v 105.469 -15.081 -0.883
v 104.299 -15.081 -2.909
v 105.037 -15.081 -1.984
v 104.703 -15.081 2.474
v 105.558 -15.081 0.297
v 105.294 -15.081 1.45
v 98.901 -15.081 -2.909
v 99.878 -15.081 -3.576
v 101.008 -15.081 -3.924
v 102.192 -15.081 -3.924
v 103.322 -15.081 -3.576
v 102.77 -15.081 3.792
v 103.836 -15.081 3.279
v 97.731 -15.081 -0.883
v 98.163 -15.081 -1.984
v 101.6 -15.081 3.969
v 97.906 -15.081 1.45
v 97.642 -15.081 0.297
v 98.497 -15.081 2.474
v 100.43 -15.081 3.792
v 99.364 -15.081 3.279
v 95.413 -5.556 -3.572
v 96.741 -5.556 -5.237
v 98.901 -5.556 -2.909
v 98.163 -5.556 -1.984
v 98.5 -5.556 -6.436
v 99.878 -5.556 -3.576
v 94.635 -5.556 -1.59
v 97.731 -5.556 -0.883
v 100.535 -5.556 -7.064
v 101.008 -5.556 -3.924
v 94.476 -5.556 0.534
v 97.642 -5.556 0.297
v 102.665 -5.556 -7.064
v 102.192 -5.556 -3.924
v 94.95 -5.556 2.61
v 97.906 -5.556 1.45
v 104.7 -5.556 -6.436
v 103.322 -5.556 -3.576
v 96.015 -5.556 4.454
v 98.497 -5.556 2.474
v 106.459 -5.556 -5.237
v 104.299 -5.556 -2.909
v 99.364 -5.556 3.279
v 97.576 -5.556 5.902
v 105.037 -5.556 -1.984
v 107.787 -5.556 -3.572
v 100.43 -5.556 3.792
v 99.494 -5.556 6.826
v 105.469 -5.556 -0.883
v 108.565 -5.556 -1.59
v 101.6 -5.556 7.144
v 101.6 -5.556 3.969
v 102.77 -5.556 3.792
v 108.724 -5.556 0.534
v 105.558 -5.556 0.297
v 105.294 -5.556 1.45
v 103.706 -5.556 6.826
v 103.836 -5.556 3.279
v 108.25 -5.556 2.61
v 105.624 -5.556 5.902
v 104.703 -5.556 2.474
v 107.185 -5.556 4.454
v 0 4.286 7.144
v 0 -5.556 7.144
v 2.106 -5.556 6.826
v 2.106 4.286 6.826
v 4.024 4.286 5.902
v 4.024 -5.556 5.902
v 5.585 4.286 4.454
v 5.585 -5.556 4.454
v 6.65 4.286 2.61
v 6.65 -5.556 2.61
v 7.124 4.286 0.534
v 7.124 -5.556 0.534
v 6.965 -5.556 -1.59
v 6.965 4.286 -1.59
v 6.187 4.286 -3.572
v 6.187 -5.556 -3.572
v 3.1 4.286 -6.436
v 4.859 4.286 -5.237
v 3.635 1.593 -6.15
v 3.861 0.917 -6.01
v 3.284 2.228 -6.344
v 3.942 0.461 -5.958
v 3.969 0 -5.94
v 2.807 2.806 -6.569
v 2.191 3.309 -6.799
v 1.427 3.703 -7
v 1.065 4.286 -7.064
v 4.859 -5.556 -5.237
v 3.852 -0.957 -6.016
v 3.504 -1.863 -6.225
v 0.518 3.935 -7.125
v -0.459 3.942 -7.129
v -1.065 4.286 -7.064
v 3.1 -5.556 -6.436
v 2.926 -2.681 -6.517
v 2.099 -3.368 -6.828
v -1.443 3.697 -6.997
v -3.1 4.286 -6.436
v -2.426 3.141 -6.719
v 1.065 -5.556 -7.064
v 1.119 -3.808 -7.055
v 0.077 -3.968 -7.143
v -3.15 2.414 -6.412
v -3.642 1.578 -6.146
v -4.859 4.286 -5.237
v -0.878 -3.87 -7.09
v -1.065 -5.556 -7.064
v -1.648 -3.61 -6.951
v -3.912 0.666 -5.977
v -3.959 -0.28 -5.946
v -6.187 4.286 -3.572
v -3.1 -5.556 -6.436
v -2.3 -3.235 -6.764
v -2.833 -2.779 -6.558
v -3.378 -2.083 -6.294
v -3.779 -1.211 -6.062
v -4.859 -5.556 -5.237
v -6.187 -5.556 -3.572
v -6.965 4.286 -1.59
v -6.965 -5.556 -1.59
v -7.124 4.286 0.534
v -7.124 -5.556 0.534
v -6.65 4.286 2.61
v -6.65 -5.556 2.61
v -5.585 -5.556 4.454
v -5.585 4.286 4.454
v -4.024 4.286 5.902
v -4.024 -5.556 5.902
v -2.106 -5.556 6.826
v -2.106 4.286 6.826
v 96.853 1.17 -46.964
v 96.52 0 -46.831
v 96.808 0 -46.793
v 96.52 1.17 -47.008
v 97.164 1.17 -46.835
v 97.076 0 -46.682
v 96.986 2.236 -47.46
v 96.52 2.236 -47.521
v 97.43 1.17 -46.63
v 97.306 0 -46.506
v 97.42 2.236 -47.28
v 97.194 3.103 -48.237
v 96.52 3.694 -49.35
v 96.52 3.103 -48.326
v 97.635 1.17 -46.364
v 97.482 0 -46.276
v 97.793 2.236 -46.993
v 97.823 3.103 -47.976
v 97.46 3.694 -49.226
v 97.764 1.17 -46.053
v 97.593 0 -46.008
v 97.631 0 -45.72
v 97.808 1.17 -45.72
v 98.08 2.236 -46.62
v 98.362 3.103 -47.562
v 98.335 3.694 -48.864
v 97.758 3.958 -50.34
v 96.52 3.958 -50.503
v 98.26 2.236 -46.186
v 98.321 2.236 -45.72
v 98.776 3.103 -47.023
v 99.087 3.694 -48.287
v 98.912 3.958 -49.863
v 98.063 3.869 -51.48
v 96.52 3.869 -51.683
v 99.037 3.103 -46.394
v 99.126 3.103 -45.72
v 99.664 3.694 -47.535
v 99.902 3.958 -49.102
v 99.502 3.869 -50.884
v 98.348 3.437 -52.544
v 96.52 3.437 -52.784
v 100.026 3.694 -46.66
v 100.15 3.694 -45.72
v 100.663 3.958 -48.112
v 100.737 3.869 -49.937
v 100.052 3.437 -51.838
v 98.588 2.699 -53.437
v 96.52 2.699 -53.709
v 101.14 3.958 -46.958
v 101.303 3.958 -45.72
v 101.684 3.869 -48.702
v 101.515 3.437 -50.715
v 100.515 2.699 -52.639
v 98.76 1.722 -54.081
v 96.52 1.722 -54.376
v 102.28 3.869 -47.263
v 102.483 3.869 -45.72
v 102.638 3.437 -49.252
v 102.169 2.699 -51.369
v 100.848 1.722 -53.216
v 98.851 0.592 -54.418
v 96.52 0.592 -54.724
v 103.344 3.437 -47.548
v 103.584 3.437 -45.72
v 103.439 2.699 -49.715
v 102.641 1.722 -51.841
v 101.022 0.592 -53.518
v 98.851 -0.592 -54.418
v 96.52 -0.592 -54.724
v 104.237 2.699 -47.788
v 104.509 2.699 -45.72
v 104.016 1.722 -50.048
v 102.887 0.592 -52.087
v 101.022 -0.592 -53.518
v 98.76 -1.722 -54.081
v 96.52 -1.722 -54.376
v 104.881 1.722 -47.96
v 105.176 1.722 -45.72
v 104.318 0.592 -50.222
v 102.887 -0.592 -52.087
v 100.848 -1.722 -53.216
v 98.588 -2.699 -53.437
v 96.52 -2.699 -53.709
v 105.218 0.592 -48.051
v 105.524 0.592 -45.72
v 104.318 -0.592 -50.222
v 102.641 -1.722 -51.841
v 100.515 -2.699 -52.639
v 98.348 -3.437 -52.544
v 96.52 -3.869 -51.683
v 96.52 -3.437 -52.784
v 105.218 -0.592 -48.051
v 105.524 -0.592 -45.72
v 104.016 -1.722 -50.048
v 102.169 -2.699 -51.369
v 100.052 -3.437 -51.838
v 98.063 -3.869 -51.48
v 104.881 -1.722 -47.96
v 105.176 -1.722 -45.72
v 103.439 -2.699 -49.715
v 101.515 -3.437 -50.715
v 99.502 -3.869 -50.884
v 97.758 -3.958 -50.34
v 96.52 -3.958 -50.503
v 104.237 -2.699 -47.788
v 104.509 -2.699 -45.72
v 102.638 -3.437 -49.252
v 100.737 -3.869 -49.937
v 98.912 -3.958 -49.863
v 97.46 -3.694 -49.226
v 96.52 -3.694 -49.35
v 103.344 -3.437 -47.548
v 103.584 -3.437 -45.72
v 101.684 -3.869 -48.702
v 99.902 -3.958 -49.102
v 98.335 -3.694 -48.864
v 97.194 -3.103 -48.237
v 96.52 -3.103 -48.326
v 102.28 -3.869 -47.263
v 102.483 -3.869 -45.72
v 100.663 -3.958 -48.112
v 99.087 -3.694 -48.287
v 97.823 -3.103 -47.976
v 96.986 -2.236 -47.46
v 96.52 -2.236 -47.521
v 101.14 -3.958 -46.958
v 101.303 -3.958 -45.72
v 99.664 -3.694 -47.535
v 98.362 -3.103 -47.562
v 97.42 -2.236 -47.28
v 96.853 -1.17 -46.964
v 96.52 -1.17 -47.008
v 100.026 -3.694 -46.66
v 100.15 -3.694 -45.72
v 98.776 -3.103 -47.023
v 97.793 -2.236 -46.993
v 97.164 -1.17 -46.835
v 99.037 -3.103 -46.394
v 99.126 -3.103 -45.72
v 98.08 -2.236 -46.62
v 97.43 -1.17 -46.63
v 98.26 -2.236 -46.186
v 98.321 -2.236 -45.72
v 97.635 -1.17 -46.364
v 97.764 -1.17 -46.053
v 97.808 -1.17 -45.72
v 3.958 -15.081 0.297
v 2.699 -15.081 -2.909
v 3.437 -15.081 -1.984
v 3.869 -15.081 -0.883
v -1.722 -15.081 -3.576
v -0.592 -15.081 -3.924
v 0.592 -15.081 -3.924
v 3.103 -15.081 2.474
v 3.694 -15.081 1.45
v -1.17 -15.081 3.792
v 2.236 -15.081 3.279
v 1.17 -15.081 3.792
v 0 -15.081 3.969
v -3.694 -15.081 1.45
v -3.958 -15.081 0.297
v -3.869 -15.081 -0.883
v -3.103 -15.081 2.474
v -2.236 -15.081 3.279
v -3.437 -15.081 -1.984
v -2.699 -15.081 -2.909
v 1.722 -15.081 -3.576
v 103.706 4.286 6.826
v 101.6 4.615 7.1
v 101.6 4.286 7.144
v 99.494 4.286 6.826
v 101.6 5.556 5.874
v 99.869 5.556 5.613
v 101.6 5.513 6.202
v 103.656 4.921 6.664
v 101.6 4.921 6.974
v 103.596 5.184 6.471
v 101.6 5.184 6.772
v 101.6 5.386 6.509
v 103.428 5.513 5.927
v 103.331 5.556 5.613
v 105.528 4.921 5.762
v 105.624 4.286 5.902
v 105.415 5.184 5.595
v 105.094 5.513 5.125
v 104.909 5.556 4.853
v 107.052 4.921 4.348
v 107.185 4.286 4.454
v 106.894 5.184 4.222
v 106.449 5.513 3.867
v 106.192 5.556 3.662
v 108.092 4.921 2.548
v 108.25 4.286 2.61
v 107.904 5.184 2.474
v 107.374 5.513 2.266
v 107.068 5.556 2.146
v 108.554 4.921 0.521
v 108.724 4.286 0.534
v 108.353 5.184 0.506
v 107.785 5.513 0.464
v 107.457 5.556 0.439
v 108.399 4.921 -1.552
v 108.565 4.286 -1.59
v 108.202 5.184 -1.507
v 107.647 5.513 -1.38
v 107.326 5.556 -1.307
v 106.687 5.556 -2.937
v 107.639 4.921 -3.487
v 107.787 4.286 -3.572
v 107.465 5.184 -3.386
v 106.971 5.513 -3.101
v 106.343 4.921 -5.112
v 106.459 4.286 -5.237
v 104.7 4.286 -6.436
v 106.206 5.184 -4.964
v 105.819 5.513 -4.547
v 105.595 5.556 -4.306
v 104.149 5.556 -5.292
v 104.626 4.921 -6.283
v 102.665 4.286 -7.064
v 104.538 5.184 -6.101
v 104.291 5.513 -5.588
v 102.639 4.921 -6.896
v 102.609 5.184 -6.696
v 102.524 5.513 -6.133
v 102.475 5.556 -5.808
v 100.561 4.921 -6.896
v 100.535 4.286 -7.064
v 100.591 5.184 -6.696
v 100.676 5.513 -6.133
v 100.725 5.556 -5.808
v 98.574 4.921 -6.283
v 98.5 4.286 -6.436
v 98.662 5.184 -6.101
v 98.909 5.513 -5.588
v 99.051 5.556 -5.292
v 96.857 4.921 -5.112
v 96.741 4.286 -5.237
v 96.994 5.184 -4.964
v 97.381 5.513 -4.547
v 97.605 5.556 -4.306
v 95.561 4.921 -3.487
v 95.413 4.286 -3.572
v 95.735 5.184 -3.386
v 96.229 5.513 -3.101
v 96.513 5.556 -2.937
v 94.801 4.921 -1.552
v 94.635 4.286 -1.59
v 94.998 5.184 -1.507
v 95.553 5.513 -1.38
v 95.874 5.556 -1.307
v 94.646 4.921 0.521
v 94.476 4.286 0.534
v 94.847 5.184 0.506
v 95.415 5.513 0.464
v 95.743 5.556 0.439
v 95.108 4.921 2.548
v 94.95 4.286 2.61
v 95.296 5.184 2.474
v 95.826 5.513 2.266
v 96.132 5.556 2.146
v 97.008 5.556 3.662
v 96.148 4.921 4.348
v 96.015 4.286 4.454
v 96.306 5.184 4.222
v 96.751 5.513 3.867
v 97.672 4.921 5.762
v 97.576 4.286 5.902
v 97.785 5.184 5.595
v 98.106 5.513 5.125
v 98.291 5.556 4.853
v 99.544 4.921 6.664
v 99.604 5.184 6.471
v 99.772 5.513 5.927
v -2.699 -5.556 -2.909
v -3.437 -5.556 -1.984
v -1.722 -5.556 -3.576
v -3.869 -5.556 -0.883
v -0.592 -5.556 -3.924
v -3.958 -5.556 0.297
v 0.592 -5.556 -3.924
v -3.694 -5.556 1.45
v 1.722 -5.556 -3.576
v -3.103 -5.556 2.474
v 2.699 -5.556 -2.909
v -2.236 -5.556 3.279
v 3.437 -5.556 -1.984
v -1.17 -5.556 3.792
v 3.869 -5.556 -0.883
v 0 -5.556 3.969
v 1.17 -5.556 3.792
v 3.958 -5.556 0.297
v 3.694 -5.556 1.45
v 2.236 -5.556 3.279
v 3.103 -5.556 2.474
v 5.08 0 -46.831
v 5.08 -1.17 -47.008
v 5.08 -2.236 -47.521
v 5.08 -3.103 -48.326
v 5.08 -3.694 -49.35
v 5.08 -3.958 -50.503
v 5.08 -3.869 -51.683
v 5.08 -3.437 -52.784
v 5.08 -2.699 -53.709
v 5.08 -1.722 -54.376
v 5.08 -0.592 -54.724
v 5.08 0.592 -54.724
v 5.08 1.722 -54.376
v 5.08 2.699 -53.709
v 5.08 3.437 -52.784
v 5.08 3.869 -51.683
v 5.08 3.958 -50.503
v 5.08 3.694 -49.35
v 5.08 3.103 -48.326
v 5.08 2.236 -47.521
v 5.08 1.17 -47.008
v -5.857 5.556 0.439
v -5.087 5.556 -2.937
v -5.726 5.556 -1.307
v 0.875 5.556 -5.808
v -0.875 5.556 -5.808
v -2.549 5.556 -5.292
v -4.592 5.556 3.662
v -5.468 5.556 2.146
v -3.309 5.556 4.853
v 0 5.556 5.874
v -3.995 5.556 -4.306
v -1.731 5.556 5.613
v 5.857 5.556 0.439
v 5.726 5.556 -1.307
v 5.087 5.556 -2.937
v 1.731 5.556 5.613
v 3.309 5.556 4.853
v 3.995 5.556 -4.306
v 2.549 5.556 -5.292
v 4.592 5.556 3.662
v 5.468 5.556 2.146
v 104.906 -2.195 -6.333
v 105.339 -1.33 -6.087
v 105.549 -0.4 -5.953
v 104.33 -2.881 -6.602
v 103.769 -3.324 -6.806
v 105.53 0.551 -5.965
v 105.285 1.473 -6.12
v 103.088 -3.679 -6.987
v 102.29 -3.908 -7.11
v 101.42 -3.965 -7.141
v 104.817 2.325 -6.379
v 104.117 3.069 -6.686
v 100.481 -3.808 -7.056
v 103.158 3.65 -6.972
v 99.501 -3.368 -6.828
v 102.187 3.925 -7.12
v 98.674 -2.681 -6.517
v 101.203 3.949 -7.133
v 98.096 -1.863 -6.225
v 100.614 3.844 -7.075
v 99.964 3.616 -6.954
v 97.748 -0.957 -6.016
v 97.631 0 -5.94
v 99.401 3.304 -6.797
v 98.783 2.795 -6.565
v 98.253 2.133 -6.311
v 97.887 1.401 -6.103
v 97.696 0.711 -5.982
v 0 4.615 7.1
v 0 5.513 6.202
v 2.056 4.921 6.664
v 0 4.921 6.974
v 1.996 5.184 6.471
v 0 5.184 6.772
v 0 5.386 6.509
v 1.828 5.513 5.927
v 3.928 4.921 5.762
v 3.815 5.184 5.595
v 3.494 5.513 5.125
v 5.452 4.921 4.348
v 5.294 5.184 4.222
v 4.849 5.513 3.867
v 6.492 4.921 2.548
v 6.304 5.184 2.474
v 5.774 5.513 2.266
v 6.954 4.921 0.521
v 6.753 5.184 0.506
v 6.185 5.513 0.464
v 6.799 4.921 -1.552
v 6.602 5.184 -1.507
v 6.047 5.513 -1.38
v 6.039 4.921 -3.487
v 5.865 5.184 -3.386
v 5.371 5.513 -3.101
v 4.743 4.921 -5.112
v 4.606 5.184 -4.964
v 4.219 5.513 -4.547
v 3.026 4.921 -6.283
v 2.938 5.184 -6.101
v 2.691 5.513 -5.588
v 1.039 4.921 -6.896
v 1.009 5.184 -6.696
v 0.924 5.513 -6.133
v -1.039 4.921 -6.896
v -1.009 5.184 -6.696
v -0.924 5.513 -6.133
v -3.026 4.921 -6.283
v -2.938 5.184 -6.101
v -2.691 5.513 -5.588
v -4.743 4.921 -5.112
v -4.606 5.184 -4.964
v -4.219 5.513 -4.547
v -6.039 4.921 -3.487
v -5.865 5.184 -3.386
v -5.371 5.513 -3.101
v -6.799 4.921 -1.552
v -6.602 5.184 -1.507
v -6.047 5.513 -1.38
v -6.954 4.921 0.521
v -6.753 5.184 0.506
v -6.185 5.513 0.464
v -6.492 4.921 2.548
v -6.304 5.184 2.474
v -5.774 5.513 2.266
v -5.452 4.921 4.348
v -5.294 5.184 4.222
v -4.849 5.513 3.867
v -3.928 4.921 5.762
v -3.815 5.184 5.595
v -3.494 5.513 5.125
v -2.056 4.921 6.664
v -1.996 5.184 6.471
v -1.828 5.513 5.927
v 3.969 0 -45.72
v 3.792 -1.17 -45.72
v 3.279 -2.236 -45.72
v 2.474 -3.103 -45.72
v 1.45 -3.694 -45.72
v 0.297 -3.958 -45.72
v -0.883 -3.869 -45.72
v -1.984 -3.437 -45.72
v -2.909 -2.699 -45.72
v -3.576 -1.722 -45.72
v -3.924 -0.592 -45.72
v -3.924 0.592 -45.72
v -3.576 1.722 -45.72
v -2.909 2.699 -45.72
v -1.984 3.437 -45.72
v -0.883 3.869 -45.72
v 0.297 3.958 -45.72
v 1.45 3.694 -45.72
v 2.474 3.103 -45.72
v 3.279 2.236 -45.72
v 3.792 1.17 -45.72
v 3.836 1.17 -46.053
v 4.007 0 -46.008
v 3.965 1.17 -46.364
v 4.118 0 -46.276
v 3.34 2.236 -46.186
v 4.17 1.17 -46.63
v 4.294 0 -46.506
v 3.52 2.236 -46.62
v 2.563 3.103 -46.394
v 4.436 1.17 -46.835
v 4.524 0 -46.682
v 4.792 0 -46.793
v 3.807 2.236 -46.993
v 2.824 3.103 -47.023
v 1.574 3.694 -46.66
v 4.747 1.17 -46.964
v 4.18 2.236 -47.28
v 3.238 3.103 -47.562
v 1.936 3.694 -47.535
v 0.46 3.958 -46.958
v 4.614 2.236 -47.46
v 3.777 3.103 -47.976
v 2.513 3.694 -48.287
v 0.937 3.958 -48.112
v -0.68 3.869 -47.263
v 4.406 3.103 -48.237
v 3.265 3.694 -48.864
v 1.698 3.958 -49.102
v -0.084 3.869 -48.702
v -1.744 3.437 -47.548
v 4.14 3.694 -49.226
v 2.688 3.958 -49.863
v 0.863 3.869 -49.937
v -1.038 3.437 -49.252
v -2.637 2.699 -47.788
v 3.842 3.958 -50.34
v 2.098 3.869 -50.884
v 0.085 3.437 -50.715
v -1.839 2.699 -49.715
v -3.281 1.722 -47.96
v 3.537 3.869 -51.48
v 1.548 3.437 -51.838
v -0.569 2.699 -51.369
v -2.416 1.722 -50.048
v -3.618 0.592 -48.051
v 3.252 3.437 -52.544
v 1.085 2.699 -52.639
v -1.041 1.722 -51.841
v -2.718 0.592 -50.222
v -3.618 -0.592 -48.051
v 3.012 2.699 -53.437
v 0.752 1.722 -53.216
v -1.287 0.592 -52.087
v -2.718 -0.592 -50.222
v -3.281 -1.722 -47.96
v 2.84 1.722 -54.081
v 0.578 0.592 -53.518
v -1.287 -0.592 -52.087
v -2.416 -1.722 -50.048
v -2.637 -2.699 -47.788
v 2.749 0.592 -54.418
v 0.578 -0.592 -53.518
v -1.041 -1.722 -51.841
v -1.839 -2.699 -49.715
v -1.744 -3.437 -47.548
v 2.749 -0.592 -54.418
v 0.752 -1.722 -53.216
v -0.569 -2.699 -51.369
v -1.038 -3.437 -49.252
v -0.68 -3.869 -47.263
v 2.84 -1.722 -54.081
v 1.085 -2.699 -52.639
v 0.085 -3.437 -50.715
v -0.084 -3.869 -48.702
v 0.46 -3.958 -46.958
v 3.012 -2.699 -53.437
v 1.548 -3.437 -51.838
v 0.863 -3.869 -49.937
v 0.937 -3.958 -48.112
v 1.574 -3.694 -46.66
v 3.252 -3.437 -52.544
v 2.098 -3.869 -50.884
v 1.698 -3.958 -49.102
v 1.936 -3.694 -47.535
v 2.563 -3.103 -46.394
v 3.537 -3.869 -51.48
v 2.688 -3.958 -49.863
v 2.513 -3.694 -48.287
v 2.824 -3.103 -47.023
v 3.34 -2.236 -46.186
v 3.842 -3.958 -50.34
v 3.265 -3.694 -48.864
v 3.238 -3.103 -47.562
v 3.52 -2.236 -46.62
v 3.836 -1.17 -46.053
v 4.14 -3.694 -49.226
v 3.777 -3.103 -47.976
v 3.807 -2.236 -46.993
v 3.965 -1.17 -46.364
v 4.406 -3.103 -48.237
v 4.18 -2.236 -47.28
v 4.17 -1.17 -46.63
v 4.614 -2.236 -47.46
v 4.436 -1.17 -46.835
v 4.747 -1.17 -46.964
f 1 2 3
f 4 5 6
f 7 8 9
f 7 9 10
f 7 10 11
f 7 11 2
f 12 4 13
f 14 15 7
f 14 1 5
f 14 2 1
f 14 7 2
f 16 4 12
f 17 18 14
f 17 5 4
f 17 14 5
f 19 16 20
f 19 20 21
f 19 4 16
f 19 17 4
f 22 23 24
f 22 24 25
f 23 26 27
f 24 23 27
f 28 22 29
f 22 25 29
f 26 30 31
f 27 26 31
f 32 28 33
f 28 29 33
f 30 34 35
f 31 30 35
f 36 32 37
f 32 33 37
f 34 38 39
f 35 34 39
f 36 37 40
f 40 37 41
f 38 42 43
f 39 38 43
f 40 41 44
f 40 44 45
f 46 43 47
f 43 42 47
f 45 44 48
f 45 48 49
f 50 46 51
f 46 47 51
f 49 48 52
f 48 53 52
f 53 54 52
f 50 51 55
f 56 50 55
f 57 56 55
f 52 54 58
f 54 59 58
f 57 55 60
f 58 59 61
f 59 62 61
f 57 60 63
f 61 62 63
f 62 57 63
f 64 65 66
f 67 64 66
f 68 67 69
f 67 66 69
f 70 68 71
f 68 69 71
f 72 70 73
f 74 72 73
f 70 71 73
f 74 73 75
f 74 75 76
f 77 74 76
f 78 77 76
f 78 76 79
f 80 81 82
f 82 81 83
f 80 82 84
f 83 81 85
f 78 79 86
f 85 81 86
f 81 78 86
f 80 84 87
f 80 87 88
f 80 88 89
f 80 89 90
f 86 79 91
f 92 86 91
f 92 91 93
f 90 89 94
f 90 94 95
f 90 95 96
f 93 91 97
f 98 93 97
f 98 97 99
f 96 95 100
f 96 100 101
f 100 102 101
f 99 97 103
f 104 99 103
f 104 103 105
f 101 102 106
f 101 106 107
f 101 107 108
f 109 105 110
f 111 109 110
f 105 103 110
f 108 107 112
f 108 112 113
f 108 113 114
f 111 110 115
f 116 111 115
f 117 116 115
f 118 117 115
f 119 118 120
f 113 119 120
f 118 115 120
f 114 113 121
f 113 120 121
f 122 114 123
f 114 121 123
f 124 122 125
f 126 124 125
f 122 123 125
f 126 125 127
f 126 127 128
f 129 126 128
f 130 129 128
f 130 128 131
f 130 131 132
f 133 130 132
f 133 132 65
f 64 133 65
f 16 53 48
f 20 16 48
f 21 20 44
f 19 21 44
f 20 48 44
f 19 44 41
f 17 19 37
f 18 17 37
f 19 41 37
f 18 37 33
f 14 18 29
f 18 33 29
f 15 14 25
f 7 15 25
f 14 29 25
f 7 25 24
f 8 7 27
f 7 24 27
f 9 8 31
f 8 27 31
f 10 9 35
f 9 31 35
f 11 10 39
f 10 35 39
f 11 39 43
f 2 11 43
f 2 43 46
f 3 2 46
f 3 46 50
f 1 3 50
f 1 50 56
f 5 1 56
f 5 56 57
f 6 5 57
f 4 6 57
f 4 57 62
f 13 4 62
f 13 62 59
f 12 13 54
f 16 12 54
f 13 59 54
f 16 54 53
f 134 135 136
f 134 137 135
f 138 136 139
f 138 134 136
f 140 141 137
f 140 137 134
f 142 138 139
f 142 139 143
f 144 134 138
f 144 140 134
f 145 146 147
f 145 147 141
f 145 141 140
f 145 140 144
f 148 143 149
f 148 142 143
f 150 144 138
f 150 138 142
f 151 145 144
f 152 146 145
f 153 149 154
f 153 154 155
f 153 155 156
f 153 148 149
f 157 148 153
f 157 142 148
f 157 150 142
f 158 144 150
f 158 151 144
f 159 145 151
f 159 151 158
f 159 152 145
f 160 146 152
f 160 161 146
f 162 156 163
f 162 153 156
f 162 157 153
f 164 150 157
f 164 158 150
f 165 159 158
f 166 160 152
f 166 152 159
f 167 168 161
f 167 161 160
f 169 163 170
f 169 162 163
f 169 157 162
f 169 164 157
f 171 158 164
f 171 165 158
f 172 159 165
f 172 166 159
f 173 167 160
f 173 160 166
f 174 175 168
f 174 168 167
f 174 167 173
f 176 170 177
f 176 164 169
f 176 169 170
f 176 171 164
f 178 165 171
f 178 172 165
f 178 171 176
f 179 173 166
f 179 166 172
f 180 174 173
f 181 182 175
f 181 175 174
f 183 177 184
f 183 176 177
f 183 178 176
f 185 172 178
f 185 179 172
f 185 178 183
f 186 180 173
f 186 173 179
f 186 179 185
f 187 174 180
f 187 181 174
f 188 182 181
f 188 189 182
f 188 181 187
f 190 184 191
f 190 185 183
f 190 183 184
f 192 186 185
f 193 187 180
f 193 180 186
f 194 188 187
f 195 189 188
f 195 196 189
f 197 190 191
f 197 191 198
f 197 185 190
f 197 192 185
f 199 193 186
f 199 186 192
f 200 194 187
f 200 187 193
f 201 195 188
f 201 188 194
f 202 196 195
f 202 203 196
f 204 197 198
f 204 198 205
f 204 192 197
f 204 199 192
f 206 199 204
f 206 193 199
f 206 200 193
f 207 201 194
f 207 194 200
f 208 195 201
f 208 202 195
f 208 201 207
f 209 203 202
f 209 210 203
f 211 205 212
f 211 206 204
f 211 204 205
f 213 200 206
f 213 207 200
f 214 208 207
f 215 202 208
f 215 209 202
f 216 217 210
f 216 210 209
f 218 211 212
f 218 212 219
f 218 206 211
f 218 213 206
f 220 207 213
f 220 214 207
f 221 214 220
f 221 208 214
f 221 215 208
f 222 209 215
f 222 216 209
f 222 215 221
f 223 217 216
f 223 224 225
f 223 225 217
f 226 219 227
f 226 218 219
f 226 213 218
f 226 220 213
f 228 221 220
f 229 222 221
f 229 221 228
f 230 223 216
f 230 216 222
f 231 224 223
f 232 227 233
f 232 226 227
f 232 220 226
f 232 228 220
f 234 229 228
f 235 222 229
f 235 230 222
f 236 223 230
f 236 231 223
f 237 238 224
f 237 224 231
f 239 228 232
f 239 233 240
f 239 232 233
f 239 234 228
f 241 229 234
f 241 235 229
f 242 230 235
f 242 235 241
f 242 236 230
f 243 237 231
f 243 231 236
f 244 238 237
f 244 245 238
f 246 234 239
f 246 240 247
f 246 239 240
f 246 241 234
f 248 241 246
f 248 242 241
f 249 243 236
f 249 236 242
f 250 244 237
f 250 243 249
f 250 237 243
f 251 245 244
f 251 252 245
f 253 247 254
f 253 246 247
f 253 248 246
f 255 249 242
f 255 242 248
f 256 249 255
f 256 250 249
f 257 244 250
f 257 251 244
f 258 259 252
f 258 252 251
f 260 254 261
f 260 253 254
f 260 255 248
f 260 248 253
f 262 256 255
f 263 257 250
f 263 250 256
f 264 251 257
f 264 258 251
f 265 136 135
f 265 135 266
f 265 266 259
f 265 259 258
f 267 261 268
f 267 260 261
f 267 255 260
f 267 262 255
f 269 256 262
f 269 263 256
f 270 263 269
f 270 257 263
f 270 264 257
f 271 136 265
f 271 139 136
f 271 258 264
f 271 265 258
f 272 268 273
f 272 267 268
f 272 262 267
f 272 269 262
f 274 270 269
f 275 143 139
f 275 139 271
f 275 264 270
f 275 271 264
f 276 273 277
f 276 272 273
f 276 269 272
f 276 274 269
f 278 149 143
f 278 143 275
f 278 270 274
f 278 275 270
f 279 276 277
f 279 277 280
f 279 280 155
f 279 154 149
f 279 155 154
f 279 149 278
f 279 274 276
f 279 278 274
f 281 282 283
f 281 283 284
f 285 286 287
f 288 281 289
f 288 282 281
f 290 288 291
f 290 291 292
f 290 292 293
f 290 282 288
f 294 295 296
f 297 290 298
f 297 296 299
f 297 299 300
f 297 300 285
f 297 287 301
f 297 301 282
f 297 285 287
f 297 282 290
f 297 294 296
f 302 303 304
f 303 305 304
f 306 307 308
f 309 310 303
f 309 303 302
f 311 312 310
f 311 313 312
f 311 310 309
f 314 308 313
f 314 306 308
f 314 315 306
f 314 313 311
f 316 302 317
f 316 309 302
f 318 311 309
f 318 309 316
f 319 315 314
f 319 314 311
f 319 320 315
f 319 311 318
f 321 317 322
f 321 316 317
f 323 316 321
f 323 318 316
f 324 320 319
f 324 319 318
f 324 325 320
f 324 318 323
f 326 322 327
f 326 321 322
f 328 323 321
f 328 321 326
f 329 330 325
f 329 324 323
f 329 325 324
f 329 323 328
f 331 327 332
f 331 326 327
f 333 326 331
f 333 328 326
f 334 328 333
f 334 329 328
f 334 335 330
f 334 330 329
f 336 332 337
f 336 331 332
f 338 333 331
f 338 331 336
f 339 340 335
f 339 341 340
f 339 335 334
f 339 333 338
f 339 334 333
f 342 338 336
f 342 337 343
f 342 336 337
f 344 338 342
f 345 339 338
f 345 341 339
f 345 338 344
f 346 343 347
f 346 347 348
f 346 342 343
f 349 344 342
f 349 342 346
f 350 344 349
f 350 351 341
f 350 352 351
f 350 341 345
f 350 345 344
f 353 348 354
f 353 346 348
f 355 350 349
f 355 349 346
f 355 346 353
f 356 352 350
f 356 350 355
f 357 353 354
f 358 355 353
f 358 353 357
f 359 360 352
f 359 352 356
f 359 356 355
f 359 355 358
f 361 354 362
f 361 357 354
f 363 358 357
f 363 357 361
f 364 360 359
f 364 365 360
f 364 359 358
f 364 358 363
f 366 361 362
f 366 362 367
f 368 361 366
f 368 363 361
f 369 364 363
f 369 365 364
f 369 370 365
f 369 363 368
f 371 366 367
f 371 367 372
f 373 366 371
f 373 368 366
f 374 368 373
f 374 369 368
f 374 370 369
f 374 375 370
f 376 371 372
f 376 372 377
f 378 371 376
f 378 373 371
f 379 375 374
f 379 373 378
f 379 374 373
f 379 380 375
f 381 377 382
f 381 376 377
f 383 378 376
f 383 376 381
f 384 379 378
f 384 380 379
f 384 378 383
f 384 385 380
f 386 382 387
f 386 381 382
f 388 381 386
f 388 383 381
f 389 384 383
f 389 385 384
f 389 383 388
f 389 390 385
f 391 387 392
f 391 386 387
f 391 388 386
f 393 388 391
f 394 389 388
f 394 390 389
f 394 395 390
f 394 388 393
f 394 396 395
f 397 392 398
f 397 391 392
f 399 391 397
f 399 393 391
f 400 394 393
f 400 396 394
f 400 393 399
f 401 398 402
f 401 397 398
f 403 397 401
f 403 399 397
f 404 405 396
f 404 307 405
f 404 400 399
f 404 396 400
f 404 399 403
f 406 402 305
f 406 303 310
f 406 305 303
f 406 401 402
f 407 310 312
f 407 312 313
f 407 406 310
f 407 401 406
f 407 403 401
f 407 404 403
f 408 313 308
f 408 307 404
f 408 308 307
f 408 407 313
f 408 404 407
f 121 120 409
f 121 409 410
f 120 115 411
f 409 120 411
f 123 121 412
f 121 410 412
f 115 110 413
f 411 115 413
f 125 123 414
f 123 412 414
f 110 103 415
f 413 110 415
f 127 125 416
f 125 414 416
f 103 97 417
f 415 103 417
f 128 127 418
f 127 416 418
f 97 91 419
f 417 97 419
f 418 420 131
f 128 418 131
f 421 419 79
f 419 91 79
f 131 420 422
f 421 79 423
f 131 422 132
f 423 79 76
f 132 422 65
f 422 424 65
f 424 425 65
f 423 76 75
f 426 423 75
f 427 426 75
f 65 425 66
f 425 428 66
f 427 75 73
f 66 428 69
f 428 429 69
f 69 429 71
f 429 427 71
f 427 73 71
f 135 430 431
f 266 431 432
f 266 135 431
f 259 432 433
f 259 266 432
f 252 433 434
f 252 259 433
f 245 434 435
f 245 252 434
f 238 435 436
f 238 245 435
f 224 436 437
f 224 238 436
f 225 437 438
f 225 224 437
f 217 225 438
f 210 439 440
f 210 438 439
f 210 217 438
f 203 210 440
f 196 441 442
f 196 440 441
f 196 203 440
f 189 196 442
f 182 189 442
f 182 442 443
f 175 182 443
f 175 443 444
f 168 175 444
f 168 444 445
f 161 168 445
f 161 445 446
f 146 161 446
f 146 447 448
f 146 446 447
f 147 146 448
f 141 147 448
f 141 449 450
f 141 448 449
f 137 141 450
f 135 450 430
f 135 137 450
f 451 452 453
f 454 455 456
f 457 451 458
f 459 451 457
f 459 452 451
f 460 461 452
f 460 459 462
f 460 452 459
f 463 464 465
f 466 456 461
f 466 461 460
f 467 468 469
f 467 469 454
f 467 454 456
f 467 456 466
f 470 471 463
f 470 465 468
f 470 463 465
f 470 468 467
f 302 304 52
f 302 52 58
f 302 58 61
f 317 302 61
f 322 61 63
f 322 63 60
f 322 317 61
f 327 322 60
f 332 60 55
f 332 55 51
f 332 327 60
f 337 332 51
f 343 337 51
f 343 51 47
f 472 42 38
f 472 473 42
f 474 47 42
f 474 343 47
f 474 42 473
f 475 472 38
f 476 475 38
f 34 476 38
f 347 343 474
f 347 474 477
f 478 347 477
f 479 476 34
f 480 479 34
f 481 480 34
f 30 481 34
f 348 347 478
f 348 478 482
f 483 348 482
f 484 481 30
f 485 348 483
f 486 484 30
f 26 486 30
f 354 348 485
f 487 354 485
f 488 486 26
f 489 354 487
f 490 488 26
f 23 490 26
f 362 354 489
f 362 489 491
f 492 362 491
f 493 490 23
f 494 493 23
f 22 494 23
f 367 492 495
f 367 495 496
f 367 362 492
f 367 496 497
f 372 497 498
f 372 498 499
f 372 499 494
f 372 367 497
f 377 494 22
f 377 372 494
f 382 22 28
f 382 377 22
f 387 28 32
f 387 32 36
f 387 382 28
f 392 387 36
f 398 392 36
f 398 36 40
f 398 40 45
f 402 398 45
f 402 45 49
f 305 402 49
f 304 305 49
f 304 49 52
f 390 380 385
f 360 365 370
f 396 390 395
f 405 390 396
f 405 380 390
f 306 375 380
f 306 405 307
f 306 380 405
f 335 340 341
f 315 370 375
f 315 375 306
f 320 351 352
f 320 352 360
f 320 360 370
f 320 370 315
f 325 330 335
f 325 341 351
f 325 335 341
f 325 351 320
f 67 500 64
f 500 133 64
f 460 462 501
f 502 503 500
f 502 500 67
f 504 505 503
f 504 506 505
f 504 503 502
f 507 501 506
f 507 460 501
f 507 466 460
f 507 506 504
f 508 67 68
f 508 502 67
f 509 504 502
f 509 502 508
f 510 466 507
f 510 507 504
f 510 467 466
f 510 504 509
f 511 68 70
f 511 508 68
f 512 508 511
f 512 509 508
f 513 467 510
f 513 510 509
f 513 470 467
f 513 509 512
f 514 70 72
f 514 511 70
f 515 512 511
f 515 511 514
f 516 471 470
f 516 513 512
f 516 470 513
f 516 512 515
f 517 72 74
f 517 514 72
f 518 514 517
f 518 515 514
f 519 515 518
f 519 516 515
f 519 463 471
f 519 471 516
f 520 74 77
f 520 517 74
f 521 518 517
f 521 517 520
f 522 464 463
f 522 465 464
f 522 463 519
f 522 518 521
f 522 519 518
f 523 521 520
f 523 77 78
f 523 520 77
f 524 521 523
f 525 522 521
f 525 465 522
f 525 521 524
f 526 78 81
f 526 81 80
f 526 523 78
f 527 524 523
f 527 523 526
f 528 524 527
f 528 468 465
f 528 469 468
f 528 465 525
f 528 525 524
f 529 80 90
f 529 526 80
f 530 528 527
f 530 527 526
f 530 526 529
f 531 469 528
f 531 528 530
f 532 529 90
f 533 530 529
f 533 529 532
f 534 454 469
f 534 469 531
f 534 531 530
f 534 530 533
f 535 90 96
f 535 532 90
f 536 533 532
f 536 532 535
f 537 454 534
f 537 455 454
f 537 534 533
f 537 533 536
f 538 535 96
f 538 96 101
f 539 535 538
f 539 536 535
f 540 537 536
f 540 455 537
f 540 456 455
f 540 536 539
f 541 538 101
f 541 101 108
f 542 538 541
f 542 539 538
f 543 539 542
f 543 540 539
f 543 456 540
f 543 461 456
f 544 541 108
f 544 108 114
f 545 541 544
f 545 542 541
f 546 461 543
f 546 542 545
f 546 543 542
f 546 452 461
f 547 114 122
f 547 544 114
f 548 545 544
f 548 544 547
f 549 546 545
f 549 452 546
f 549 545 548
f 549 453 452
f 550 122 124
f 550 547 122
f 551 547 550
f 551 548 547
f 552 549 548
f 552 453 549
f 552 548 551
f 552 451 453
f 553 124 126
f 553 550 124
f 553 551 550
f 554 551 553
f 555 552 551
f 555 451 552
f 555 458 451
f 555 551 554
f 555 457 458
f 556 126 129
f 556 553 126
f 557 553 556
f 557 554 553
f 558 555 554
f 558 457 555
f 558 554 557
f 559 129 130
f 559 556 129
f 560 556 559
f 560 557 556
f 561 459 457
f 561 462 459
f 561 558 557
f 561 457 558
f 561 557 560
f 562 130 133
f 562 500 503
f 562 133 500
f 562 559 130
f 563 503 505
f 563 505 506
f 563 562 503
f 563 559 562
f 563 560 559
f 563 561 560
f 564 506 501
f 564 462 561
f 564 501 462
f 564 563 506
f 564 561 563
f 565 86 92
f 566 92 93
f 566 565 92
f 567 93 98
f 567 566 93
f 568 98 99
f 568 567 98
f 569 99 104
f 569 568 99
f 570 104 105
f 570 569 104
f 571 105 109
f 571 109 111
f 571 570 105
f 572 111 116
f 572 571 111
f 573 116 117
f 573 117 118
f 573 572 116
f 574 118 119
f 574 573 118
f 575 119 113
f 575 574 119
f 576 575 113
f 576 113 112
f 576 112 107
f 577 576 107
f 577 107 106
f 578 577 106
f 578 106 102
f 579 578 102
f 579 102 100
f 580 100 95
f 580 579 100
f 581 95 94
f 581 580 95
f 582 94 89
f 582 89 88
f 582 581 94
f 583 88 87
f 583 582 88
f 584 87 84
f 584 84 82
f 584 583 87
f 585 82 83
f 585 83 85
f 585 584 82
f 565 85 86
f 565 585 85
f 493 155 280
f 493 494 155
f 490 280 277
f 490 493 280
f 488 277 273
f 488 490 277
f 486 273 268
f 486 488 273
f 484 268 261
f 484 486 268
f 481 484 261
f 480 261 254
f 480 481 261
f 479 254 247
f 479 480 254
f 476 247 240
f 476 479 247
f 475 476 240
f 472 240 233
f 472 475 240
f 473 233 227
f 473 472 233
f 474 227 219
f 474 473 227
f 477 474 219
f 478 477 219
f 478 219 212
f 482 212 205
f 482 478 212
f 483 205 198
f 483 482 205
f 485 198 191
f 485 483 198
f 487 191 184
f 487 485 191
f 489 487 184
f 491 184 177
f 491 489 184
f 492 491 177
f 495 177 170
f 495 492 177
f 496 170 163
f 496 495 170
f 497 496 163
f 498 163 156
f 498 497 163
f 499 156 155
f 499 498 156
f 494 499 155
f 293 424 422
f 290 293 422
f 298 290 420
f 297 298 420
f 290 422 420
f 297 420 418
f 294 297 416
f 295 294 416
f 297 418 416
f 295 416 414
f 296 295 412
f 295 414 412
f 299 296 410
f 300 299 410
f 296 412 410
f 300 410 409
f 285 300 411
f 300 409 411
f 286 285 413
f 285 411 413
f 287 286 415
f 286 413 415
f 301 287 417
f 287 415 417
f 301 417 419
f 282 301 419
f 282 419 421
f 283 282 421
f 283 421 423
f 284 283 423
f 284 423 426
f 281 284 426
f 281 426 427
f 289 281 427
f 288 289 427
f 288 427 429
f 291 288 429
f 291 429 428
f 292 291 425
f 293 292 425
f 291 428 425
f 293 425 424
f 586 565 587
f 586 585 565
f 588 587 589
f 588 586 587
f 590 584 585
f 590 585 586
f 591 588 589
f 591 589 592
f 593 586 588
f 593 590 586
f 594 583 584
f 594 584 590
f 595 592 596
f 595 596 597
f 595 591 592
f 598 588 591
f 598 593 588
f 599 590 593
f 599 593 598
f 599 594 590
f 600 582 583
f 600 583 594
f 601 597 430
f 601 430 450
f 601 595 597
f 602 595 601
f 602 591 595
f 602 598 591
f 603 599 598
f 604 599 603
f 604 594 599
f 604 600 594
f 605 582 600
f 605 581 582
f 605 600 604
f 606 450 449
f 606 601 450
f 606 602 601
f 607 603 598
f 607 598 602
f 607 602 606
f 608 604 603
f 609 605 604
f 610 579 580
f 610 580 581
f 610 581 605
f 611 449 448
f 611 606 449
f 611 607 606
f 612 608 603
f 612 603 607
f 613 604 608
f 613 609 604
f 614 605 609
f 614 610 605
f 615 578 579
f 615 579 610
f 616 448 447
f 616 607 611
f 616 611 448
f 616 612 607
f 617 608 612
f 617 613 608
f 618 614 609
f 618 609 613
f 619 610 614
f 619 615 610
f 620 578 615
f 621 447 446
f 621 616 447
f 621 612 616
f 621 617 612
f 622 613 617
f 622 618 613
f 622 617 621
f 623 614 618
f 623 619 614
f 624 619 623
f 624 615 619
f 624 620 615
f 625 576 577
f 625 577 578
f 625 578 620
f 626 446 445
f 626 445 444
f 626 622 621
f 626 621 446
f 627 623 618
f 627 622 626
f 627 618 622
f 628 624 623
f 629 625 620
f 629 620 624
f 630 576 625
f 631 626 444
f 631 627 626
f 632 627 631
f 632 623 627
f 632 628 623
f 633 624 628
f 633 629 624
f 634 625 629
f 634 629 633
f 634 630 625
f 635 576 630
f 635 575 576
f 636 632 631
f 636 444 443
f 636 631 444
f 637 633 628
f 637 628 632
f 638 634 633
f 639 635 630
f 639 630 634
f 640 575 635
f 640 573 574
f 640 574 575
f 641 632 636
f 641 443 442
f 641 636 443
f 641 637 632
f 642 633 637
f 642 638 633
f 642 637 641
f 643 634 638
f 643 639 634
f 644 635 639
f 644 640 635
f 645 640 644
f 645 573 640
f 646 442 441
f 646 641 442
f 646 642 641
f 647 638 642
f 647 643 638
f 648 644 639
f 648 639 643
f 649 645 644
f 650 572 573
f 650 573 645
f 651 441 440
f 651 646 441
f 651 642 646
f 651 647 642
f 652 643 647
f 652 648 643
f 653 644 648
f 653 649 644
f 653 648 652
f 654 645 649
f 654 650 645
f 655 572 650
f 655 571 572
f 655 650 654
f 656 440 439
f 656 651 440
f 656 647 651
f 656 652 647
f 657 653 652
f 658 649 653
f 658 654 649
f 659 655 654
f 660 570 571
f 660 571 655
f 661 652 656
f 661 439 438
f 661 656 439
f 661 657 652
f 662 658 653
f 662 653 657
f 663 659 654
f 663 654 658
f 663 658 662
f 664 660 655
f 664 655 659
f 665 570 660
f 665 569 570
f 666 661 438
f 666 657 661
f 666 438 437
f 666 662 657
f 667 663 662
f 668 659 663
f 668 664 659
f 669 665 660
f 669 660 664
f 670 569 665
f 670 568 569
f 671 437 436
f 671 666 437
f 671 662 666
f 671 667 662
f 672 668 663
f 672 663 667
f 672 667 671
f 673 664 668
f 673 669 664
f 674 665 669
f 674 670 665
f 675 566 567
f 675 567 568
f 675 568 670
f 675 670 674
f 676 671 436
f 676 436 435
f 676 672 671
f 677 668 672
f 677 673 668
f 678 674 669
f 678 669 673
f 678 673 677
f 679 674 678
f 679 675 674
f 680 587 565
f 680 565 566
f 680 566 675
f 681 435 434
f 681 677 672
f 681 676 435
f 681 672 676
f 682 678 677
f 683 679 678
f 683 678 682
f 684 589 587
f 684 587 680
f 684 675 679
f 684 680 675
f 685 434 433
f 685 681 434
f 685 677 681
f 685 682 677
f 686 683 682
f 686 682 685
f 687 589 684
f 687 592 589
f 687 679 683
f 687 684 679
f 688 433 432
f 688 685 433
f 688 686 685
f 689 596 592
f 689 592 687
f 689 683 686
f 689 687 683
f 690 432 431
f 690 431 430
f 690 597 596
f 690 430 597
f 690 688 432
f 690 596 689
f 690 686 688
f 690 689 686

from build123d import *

# Parameters (mm, degrees)
SKETCH2_R      = 3.96875
SKETCH3_R      = 7.14375
EXTRUDE1_DEPTH = 5.55625
SKETCH4_R      = 3.96875
EXTRUDE2_DEPTH = 9.525
FILLET1_R      = 1.27


with BuildPart() as part:
    # Sweep1: sweep along a path in Sketch1
    with BuildLine(Plane(origin=(0, 0, 0), x_dir=(1, 0, 0), z_dir=(0, 1, 0))) as sweep1_path:
        Line((0, 0), (0, 45.72))
        ThreePointArc((0, 45.72), (1.487897552, 49.312102448), (5.08, 50.8))
        Line((5.08, 50.8), (96.52, 50.8))
        ThreePointArc((96.52, 50.8), (100.112102448, 49.312102448), (101.6, 45.72))
        Line((101.6, 45.72), (101.6, 0))
    # Sketch2 → Sweep1 (sweep)
    with BuildSketch(Plane.XY):
        Circle(SKETCH2_R)
    sweep(path=sweep1_path.line)

    # Sketch3 → Extrude1 (add, symmetric)
    with BuildSketch(Plane(origin=(0, 0, 0), x_dir=(1, 0, 0), z_dir=(0, 1, 0))):
        with Locations(Location((0, 0, 0), (0, 0, 270))):
            Circle(SKETCH3_R)
        with Locations(Location((101.6, 0, 0), (0, 0, 270))):
            Circle(SKETCH3_R)
    extrude(amount=EXTRUDE1_DEPTH, both=True)

    # Sketch4 → Extrude2 (add)
    with BuildSketch(Plane.XZ.offset(5.55625)):
        with Locations(Location((0, 0, 0), (0, 0, 90))):
            Circle(SKETCH4_R)
        with Locations(Location((101.6, 0, 0), (0, 0, 90))):
            Circle(SKETCH4_R)
    extrude(amount=EXTRUDE2_DEPTH)

    # Fillet1
    fillet1_edges = [part.edges().sort_by_distance(p)[0] for p in [
        (0, 5.55625, -7.14375),
        (101.6, 5.55625, -7.14375),
    ]]
    fillet(fillet1_edges, radius=FILLET1_R)


solid = part.part
